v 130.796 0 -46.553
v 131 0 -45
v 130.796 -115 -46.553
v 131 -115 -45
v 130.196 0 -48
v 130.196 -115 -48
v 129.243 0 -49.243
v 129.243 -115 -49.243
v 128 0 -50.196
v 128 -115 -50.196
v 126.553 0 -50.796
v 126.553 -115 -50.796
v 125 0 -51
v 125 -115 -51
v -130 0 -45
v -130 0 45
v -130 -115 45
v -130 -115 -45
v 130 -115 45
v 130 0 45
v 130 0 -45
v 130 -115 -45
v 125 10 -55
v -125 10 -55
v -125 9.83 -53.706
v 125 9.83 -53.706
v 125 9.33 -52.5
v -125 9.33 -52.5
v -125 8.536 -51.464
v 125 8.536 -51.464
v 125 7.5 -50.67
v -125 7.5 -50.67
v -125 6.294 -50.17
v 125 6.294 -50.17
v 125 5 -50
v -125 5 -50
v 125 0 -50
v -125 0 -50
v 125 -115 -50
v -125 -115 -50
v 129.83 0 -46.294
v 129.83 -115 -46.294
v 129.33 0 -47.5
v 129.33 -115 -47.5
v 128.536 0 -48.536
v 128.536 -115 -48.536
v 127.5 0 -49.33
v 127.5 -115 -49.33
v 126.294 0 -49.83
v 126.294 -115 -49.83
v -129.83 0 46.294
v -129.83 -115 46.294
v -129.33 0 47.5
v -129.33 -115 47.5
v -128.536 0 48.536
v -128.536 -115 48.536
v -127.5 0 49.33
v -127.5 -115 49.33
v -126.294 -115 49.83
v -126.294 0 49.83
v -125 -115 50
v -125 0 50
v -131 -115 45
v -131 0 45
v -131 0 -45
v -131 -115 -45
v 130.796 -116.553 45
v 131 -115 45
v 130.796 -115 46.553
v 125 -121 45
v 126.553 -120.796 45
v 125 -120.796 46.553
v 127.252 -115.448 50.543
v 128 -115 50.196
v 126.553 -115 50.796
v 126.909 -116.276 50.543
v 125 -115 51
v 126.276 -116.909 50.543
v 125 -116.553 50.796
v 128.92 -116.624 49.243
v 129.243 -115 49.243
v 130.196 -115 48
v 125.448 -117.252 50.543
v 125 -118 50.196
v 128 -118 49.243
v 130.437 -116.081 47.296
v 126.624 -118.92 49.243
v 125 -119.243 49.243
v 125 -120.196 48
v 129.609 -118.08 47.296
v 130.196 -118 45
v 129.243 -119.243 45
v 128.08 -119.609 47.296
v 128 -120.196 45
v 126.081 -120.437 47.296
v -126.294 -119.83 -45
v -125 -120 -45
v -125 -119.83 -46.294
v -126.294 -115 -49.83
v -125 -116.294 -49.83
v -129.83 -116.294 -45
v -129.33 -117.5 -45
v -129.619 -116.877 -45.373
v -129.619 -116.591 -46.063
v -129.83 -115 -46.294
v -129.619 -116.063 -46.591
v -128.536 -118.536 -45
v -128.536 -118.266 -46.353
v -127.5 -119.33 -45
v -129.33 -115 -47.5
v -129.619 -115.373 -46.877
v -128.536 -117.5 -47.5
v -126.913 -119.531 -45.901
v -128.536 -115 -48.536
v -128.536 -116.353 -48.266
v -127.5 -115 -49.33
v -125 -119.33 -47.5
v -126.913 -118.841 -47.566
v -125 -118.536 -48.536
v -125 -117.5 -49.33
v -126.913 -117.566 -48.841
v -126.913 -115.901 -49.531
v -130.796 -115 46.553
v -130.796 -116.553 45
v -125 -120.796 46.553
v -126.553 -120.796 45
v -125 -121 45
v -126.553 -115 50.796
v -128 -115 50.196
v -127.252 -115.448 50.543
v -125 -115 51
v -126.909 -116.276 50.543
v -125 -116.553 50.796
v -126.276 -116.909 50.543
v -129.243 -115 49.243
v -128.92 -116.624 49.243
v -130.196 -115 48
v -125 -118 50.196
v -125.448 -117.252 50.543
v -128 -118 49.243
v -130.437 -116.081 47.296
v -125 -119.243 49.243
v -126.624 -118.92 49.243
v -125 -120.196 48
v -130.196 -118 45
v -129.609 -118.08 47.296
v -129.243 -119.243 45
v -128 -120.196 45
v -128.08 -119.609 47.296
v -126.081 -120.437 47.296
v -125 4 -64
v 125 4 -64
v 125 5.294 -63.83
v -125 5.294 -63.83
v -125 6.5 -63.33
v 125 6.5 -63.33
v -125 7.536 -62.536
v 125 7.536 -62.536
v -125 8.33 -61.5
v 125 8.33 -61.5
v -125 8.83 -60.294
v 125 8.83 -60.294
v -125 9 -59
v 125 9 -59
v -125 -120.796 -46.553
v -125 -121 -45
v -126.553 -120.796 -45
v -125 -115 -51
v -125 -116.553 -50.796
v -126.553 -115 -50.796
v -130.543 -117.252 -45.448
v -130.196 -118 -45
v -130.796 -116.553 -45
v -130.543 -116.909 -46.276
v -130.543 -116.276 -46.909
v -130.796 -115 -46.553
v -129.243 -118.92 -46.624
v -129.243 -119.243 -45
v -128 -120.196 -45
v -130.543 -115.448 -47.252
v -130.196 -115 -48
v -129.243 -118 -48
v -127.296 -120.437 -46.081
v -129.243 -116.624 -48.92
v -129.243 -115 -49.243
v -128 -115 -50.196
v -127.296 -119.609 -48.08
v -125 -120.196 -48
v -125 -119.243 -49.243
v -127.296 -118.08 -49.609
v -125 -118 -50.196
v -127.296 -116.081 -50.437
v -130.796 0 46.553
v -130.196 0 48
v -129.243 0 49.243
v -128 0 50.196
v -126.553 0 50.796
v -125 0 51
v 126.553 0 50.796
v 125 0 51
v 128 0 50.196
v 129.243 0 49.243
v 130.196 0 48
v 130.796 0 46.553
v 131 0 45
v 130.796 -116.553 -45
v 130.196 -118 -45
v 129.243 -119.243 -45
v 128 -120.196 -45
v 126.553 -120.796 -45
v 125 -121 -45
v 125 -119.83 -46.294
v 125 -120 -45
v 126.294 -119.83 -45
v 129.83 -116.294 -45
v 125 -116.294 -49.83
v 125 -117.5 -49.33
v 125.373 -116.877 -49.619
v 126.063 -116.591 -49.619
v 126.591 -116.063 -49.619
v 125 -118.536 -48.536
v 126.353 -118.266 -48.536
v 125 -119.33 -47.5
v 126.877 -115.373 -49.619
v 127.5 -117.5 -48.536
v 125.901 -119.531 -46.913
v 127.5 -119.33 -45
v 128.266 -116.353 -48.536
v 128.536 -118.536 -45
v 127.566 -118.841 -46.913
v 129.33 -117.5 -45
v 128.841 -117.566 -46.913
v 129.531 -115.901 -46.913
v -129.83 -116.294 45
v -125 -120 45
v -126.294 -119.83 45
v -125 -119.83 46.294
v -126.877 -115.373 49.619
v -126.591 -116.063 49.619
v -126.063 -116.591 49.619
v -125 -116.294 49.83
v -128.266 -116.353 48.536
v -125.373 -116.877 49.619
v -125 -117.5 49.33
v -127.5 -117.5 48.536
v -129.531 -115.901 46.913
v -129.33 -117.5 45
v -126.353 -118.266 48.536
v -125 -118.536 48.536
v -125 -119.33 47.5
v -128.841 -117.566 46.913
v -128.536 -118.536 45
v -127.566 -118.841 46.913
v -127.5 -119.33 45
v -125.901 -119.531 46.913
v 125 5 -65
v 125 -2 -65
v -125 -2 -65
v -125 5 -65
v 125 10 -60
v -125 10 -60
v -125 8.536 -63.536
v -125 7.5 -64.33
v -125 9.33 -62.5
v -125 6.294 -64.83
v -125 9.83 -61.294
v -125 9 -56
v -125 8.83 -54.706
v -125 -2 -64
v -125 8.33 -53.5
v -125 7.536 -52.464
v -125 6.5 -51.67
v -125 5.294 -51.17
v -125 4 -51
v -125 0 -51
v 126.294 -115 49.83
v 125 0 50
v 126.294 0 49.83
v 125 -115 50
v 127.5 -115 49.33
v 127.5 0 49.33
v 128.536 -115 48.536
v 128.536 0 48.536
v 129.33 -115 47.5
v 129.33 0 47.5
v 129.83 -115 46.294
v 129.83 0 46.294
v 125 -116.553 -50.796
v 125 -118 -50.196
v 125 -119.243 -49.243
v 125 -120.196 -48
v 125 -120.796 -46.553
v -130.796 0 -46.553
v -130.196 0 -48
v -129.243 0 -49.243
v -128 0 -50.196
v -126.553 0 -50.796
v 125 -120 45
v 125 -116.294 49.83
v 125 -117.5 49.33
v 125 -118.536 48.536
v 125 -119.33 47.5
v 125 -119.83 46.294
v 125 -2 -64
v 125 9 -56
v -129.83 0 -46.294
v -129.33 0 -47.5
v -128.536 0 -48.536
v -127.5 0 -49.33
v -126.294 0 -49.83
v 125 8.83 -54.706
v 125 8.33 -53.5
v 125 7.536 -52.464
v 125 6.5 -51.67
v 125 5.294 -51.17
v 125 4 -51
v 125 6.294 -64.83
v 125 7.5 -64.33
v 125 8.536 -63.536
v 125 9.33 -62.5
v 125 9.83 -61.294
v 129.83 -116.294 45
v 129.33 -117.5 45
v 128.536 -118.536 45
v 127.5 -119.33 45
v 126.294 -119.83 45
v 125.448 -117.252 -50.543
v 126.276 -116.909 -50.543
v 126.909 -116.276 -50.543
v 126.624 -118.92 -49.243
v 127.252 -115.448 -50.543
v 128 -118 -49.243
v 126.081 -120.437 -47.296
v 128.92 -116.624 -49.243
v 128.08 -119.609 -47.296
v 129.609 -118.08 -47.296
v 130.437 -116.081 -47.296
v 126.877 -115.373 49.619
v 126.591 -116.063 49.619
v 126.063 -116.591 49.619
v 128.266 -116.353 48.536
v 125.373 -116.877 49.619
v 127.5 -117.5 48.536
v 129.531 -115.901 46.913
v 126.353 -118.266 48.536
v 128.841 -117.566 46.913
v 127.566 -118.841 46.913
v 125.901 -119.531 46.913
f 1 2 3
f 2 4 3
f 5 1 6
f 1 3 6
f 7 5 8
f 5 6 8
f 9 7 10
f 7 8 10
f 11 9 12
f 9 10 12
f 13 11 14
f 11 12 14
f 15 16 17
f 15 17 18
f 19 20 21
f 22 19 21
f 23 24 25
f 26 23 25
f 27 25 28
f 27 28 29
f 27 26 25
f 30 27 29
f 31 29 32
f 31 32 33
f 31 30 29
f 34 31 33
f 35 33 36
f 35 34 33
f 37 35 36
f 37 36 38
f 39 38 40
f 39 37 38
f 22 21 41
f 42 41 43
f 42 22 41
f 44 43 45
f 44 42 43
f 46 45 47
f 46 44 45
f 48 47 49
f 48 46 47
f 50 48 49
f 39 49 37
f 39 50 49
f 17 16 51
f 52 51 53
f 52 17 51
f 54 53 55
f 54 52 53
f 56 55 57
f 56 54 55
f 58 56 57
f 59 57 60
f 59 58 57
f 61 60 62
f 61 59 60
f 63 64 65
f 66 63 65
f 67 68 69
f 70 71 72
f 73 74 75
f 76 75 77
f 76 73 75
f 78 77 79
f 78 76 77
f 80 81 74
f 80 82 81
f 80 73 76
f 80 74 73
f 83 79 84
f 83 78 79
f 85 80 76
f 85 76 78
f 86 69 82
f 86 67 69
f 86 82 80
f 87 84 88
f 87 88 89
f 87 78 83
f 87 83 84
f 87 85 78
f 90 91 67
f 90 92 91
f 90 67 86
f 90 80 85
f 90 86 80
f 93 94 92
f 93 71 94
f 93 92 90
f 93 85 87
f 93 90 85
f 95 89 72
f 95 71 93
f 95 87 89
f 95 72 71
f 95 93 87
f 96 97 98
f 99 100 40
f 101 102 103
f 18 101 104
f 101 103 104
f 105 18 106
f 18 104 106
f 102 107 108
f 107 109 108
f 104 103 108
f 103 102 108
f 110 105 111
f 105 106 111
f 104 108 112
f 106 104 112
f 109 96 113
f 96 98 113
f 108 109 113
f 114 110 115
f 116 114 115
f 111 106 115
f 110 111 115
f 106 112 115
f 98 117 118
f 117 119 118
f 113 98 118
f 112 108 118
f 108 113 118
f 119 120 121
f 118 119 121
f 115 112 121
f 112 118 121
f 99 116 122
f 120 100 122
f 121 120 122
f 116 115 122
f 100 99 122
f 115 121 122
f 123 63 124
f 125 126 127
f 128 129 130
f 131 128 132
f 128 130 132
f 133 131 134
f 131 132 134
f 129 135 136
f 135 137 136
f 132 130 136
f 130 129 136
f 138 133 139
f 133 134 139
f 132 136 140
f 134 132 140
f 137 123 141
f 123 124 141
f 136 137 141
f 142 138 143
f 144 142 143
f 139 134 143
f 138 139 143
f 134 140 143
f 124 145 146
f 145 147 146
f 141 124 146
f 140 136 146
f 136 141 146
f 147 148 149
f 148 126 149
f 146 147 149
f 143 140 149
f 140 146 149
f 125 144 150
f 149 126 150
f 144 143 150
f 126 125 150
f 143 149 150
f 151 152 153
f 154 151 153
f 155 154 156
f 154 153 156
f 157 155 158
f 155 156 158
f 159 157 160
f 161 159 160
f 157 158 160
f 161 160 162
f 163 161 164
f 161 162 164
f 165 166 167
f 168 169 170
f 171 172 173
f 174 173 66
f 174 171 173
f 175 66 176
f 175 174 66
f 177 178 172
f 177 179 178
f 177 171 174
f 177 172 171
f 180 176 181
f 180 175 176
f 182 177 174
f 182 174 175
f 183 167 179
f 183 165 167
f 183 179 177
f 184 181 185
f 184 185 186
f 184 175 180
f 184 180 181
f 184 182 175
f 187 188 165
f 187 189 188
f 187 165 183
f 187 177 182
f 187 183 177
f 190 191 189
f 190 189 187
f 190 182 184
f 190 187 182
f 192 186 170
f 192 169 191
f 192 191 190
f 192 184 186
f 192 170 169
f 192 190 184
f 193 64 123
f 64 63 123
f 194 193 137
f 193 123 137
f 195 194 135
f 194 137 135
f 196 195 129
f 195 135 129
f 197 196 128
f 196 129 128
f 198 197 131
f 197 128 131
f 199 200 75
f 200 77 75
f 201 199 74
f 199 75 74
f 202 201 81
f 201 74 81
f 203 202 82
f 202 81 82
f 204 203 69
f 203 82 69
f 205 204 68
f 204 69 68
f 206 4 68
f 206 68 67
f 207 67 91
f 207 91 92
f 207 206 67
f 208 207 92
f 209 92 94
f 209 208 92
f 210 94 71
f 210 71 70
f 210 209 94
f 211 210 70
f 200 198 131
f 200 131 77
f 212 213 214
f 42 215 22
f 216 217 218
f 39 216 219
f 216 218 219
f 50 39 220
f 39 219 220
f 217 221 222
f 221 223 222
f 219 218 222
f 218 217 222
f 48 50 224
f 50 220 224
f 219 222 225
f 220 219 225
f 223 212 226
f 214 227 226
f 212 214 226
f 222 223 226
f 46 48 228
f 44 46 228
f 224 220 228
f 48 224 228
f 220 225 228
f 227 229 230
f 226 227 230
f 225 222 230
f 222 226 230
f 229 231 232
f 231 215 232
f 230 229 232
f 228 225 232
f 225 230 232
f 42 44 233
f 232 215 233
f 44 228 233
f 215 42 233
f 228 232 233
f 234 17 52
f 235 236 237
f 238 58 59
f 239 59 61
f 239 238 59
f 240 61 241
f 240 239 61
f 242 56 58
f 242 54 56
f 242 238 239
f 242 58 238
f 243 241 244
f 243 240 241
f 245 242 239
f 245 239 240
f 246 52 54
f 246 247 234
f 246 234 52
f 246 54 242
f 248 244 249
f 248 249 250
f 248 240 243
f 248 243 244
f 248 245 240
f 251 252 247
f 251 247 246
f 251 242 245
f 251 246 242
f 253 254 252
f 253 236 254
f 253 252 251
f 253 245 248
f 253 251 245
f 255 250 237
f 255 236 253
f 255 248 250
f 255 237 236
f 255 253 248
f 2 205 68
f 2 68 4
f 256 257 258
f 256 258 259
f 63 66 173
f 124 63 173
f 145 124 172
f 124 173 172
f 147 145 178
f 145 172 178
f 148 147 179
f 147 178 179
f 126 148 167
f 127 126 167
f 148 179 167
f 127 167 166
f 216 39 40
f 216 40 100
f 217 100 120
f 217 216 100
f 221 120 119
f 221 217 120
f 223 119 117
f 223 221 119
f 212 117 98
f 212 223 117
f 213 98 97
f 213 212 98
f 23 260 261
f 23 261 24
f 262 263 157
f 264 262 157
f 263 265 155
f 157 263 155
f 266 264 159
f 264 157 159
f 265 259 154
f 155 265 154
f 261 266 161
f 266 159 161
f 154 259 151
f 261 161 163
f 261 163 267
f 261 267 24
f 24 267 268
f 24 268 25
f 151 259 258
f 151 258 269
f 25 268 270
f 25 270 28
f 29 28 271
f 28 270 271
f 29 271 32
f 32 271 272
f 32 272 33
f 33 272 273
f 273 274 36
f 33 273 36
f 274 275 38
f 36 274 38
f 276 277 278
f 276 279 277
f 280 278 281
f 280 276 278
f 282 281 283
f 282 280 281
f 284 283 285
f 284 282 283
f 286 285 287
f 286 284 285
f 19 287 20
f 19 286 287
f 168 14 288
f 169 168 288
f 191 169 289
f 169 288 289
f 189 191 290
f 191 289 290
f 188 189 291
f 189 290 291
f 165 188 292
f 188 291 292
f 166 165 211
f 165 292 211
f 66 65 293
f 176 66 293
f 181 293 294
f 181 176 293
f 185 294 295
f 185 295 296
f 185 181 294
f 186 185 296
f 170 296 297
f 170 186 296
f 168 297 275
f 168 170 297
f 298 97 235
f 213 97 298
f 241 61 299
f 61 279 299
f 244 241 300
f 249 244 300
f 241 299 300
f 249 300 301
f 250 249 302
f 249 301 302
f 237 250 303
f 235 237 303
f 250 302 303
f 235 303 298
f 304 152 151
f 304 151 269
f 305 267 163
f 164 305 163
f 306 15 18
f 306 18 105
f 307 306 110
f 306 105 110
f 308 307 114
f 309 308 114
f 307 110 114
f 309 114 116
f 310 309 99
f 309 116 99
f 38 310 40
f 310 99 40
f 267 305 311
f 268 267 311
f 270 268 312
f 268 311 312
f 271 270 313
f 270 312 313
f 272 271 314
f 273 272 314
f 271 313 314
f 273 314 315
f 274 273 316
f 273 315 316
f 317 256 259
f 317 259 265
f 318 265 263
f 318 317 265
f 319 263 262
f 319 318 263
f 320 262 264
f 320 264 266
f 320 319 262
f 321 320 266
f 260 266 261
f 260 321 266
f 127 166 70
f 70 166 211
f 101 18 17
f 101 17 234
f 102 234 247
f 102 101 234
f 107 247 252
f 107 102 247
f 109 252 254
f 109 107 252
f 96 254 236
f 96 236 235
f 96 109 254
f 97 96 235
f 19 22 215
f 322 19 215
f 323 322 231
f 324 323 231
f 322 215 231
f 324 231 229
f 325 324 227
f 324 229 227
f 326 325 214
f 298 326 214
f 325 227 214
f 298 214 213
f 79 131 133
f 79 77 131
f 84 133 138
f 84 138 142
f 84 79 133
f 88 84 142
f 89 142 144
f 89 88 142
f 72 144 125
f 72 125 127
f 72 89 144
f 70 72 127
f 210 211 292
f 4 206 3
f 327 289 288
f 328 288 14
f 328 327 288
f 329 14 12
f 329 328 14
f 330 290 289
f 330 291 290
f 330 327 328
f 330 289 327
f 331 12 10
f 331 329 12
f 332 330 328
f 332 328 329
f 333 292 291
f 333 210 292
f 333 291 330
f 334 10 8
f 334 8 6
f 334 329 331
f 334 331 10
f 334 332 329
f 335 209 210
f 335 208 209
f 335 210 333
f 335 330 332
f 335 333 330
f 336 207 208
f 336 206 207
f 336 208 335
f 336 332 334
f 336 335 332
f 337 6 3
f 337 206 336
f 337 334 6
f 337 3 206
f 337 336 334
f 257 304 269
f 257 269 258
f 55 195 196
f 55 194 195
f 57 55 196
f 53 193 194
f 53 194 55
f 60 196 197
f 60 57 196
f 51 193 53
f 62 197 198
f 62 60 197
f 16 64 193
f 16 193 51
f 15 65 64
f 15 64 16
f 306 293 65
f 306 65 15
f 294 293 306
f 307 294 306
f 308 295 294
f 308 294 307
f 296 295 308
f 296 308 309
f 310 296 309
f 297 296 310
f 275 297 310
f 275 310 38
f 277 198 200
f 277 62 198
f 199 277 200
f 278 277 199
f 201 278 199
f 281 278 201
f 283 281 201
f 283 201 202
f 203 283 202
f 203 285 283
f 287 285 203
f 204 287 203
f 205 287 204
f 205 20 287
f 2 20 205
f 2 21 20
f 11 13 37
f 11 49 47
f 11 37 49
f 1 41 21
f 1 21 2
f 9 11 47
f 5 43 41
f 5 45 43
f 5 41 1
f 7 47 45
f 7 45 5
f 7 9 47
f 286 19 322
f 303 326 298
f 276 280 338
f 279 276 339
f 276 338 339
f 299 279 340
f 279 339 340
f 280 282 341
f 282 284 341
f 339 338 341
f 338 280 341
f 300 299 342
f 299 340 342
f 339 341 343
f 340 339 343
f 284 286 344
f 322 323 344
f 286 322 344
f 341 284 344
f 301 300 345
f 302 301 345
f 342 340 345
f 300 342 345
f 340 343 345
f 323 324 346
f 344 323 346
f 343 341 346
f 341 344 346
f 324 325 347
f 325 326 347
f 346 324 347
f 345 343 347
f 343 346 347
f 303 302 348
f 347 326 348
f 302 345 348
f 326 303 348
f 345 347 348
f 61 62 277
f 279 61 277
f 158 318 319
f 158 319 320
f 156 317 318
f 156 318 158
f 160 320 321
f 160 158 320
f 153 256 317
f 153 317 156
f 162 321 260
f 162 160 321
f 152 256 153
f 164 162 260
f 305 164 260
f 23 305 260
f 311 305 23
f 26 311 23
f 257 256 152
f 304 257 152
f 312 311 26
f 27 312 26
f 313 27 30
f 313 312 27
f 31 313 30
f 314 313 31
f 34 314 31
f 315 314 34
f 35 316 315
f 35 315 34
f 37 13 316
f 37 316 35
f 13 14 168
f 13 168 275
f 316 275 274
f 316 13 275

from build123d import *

# Parameters (mm, degrees)
SKETCH1_W           = 260
SKETCH1_H           = 100
BOSS_EXTRUDE1_DEPTH = 120
FILLET1_R           = 5
SHELL1_T            = 1


with BuildPart() as part:
    # Sketch1 → Boss-Extrude1 (new body)
    with BuildSketch(Plane(origin=(0, 0, 0), x_dir=(1, 0, 0), z_dir=(0, 1, 0))):
        Rectangle(SKETCH1_W, SKETCH1_H)
    extrude(amount=-BOSS_EXTRUDE1_DEPTH)

    # Fillet1
    fillet1_edges = [part.edges().sort_by_distance(p)[0] for p in [
        (130, -120, 0),
        (0, -120, -50),
        (-130, -120, 0),
        (-130, -60, -50),
        (130, -60, -50),
        (130, -60, 50),
        (-130, -60, 50),
        (0, -120, 50),
    ]]
    fillet(fillet1_edges, radius=FILLET1_R)

    # Shell1
    shell1_openings = [part.faces().sort_by_distance(p)[0] for p in [
        (0, 0, 0),
    ]]
    offset(amount=SHELL1_T, openings=shell1_openings, kind=Kind.INTERSECTION)

    # Sweep1: sweep along a path in Sketch3
    with BuildLine(Plane(origin=(0, 0, 0), x_dir=(1, 0, 0), z_dir=(0, 1, 0))) as sweep1_path:
        Line((-125, 51), (125, 51))
    # Sketch2 → Sweep1 (sweep)
    with BuildSketch(Plane(origin=(0, 0, 0), x_dir=(0, 0, -1), z_dir=(1, 0, 0))):
        with BuildLine():
            Line((51, 0), (51, 4))
            ThreePointArc((51, 4), (52.464466094, 7.535533906), (56, 9))
            Line((56, 9), (59, 9))
            ThreePointArc((59, 9), (62.535533906, 7.535533906), (64, 4))
            Line((64, 4), (64, -2))
            Line((64, -2), (65, -2))
            Line((65, -2), (65, 5))
            ThreePointArc((65, 5), (63.535533906, 8.535533906), (60, 10))
            Line((60, 10), (55, 10))
            ThreePointArc((55, 10), (51.464466094, 8.535533906), (50, 5))
            Line((50, 5), (50, 0))
            Line((50, 0), (51, 0))
        make_face()
    sweep(path=sweep1_path.line)


solid = part.part
